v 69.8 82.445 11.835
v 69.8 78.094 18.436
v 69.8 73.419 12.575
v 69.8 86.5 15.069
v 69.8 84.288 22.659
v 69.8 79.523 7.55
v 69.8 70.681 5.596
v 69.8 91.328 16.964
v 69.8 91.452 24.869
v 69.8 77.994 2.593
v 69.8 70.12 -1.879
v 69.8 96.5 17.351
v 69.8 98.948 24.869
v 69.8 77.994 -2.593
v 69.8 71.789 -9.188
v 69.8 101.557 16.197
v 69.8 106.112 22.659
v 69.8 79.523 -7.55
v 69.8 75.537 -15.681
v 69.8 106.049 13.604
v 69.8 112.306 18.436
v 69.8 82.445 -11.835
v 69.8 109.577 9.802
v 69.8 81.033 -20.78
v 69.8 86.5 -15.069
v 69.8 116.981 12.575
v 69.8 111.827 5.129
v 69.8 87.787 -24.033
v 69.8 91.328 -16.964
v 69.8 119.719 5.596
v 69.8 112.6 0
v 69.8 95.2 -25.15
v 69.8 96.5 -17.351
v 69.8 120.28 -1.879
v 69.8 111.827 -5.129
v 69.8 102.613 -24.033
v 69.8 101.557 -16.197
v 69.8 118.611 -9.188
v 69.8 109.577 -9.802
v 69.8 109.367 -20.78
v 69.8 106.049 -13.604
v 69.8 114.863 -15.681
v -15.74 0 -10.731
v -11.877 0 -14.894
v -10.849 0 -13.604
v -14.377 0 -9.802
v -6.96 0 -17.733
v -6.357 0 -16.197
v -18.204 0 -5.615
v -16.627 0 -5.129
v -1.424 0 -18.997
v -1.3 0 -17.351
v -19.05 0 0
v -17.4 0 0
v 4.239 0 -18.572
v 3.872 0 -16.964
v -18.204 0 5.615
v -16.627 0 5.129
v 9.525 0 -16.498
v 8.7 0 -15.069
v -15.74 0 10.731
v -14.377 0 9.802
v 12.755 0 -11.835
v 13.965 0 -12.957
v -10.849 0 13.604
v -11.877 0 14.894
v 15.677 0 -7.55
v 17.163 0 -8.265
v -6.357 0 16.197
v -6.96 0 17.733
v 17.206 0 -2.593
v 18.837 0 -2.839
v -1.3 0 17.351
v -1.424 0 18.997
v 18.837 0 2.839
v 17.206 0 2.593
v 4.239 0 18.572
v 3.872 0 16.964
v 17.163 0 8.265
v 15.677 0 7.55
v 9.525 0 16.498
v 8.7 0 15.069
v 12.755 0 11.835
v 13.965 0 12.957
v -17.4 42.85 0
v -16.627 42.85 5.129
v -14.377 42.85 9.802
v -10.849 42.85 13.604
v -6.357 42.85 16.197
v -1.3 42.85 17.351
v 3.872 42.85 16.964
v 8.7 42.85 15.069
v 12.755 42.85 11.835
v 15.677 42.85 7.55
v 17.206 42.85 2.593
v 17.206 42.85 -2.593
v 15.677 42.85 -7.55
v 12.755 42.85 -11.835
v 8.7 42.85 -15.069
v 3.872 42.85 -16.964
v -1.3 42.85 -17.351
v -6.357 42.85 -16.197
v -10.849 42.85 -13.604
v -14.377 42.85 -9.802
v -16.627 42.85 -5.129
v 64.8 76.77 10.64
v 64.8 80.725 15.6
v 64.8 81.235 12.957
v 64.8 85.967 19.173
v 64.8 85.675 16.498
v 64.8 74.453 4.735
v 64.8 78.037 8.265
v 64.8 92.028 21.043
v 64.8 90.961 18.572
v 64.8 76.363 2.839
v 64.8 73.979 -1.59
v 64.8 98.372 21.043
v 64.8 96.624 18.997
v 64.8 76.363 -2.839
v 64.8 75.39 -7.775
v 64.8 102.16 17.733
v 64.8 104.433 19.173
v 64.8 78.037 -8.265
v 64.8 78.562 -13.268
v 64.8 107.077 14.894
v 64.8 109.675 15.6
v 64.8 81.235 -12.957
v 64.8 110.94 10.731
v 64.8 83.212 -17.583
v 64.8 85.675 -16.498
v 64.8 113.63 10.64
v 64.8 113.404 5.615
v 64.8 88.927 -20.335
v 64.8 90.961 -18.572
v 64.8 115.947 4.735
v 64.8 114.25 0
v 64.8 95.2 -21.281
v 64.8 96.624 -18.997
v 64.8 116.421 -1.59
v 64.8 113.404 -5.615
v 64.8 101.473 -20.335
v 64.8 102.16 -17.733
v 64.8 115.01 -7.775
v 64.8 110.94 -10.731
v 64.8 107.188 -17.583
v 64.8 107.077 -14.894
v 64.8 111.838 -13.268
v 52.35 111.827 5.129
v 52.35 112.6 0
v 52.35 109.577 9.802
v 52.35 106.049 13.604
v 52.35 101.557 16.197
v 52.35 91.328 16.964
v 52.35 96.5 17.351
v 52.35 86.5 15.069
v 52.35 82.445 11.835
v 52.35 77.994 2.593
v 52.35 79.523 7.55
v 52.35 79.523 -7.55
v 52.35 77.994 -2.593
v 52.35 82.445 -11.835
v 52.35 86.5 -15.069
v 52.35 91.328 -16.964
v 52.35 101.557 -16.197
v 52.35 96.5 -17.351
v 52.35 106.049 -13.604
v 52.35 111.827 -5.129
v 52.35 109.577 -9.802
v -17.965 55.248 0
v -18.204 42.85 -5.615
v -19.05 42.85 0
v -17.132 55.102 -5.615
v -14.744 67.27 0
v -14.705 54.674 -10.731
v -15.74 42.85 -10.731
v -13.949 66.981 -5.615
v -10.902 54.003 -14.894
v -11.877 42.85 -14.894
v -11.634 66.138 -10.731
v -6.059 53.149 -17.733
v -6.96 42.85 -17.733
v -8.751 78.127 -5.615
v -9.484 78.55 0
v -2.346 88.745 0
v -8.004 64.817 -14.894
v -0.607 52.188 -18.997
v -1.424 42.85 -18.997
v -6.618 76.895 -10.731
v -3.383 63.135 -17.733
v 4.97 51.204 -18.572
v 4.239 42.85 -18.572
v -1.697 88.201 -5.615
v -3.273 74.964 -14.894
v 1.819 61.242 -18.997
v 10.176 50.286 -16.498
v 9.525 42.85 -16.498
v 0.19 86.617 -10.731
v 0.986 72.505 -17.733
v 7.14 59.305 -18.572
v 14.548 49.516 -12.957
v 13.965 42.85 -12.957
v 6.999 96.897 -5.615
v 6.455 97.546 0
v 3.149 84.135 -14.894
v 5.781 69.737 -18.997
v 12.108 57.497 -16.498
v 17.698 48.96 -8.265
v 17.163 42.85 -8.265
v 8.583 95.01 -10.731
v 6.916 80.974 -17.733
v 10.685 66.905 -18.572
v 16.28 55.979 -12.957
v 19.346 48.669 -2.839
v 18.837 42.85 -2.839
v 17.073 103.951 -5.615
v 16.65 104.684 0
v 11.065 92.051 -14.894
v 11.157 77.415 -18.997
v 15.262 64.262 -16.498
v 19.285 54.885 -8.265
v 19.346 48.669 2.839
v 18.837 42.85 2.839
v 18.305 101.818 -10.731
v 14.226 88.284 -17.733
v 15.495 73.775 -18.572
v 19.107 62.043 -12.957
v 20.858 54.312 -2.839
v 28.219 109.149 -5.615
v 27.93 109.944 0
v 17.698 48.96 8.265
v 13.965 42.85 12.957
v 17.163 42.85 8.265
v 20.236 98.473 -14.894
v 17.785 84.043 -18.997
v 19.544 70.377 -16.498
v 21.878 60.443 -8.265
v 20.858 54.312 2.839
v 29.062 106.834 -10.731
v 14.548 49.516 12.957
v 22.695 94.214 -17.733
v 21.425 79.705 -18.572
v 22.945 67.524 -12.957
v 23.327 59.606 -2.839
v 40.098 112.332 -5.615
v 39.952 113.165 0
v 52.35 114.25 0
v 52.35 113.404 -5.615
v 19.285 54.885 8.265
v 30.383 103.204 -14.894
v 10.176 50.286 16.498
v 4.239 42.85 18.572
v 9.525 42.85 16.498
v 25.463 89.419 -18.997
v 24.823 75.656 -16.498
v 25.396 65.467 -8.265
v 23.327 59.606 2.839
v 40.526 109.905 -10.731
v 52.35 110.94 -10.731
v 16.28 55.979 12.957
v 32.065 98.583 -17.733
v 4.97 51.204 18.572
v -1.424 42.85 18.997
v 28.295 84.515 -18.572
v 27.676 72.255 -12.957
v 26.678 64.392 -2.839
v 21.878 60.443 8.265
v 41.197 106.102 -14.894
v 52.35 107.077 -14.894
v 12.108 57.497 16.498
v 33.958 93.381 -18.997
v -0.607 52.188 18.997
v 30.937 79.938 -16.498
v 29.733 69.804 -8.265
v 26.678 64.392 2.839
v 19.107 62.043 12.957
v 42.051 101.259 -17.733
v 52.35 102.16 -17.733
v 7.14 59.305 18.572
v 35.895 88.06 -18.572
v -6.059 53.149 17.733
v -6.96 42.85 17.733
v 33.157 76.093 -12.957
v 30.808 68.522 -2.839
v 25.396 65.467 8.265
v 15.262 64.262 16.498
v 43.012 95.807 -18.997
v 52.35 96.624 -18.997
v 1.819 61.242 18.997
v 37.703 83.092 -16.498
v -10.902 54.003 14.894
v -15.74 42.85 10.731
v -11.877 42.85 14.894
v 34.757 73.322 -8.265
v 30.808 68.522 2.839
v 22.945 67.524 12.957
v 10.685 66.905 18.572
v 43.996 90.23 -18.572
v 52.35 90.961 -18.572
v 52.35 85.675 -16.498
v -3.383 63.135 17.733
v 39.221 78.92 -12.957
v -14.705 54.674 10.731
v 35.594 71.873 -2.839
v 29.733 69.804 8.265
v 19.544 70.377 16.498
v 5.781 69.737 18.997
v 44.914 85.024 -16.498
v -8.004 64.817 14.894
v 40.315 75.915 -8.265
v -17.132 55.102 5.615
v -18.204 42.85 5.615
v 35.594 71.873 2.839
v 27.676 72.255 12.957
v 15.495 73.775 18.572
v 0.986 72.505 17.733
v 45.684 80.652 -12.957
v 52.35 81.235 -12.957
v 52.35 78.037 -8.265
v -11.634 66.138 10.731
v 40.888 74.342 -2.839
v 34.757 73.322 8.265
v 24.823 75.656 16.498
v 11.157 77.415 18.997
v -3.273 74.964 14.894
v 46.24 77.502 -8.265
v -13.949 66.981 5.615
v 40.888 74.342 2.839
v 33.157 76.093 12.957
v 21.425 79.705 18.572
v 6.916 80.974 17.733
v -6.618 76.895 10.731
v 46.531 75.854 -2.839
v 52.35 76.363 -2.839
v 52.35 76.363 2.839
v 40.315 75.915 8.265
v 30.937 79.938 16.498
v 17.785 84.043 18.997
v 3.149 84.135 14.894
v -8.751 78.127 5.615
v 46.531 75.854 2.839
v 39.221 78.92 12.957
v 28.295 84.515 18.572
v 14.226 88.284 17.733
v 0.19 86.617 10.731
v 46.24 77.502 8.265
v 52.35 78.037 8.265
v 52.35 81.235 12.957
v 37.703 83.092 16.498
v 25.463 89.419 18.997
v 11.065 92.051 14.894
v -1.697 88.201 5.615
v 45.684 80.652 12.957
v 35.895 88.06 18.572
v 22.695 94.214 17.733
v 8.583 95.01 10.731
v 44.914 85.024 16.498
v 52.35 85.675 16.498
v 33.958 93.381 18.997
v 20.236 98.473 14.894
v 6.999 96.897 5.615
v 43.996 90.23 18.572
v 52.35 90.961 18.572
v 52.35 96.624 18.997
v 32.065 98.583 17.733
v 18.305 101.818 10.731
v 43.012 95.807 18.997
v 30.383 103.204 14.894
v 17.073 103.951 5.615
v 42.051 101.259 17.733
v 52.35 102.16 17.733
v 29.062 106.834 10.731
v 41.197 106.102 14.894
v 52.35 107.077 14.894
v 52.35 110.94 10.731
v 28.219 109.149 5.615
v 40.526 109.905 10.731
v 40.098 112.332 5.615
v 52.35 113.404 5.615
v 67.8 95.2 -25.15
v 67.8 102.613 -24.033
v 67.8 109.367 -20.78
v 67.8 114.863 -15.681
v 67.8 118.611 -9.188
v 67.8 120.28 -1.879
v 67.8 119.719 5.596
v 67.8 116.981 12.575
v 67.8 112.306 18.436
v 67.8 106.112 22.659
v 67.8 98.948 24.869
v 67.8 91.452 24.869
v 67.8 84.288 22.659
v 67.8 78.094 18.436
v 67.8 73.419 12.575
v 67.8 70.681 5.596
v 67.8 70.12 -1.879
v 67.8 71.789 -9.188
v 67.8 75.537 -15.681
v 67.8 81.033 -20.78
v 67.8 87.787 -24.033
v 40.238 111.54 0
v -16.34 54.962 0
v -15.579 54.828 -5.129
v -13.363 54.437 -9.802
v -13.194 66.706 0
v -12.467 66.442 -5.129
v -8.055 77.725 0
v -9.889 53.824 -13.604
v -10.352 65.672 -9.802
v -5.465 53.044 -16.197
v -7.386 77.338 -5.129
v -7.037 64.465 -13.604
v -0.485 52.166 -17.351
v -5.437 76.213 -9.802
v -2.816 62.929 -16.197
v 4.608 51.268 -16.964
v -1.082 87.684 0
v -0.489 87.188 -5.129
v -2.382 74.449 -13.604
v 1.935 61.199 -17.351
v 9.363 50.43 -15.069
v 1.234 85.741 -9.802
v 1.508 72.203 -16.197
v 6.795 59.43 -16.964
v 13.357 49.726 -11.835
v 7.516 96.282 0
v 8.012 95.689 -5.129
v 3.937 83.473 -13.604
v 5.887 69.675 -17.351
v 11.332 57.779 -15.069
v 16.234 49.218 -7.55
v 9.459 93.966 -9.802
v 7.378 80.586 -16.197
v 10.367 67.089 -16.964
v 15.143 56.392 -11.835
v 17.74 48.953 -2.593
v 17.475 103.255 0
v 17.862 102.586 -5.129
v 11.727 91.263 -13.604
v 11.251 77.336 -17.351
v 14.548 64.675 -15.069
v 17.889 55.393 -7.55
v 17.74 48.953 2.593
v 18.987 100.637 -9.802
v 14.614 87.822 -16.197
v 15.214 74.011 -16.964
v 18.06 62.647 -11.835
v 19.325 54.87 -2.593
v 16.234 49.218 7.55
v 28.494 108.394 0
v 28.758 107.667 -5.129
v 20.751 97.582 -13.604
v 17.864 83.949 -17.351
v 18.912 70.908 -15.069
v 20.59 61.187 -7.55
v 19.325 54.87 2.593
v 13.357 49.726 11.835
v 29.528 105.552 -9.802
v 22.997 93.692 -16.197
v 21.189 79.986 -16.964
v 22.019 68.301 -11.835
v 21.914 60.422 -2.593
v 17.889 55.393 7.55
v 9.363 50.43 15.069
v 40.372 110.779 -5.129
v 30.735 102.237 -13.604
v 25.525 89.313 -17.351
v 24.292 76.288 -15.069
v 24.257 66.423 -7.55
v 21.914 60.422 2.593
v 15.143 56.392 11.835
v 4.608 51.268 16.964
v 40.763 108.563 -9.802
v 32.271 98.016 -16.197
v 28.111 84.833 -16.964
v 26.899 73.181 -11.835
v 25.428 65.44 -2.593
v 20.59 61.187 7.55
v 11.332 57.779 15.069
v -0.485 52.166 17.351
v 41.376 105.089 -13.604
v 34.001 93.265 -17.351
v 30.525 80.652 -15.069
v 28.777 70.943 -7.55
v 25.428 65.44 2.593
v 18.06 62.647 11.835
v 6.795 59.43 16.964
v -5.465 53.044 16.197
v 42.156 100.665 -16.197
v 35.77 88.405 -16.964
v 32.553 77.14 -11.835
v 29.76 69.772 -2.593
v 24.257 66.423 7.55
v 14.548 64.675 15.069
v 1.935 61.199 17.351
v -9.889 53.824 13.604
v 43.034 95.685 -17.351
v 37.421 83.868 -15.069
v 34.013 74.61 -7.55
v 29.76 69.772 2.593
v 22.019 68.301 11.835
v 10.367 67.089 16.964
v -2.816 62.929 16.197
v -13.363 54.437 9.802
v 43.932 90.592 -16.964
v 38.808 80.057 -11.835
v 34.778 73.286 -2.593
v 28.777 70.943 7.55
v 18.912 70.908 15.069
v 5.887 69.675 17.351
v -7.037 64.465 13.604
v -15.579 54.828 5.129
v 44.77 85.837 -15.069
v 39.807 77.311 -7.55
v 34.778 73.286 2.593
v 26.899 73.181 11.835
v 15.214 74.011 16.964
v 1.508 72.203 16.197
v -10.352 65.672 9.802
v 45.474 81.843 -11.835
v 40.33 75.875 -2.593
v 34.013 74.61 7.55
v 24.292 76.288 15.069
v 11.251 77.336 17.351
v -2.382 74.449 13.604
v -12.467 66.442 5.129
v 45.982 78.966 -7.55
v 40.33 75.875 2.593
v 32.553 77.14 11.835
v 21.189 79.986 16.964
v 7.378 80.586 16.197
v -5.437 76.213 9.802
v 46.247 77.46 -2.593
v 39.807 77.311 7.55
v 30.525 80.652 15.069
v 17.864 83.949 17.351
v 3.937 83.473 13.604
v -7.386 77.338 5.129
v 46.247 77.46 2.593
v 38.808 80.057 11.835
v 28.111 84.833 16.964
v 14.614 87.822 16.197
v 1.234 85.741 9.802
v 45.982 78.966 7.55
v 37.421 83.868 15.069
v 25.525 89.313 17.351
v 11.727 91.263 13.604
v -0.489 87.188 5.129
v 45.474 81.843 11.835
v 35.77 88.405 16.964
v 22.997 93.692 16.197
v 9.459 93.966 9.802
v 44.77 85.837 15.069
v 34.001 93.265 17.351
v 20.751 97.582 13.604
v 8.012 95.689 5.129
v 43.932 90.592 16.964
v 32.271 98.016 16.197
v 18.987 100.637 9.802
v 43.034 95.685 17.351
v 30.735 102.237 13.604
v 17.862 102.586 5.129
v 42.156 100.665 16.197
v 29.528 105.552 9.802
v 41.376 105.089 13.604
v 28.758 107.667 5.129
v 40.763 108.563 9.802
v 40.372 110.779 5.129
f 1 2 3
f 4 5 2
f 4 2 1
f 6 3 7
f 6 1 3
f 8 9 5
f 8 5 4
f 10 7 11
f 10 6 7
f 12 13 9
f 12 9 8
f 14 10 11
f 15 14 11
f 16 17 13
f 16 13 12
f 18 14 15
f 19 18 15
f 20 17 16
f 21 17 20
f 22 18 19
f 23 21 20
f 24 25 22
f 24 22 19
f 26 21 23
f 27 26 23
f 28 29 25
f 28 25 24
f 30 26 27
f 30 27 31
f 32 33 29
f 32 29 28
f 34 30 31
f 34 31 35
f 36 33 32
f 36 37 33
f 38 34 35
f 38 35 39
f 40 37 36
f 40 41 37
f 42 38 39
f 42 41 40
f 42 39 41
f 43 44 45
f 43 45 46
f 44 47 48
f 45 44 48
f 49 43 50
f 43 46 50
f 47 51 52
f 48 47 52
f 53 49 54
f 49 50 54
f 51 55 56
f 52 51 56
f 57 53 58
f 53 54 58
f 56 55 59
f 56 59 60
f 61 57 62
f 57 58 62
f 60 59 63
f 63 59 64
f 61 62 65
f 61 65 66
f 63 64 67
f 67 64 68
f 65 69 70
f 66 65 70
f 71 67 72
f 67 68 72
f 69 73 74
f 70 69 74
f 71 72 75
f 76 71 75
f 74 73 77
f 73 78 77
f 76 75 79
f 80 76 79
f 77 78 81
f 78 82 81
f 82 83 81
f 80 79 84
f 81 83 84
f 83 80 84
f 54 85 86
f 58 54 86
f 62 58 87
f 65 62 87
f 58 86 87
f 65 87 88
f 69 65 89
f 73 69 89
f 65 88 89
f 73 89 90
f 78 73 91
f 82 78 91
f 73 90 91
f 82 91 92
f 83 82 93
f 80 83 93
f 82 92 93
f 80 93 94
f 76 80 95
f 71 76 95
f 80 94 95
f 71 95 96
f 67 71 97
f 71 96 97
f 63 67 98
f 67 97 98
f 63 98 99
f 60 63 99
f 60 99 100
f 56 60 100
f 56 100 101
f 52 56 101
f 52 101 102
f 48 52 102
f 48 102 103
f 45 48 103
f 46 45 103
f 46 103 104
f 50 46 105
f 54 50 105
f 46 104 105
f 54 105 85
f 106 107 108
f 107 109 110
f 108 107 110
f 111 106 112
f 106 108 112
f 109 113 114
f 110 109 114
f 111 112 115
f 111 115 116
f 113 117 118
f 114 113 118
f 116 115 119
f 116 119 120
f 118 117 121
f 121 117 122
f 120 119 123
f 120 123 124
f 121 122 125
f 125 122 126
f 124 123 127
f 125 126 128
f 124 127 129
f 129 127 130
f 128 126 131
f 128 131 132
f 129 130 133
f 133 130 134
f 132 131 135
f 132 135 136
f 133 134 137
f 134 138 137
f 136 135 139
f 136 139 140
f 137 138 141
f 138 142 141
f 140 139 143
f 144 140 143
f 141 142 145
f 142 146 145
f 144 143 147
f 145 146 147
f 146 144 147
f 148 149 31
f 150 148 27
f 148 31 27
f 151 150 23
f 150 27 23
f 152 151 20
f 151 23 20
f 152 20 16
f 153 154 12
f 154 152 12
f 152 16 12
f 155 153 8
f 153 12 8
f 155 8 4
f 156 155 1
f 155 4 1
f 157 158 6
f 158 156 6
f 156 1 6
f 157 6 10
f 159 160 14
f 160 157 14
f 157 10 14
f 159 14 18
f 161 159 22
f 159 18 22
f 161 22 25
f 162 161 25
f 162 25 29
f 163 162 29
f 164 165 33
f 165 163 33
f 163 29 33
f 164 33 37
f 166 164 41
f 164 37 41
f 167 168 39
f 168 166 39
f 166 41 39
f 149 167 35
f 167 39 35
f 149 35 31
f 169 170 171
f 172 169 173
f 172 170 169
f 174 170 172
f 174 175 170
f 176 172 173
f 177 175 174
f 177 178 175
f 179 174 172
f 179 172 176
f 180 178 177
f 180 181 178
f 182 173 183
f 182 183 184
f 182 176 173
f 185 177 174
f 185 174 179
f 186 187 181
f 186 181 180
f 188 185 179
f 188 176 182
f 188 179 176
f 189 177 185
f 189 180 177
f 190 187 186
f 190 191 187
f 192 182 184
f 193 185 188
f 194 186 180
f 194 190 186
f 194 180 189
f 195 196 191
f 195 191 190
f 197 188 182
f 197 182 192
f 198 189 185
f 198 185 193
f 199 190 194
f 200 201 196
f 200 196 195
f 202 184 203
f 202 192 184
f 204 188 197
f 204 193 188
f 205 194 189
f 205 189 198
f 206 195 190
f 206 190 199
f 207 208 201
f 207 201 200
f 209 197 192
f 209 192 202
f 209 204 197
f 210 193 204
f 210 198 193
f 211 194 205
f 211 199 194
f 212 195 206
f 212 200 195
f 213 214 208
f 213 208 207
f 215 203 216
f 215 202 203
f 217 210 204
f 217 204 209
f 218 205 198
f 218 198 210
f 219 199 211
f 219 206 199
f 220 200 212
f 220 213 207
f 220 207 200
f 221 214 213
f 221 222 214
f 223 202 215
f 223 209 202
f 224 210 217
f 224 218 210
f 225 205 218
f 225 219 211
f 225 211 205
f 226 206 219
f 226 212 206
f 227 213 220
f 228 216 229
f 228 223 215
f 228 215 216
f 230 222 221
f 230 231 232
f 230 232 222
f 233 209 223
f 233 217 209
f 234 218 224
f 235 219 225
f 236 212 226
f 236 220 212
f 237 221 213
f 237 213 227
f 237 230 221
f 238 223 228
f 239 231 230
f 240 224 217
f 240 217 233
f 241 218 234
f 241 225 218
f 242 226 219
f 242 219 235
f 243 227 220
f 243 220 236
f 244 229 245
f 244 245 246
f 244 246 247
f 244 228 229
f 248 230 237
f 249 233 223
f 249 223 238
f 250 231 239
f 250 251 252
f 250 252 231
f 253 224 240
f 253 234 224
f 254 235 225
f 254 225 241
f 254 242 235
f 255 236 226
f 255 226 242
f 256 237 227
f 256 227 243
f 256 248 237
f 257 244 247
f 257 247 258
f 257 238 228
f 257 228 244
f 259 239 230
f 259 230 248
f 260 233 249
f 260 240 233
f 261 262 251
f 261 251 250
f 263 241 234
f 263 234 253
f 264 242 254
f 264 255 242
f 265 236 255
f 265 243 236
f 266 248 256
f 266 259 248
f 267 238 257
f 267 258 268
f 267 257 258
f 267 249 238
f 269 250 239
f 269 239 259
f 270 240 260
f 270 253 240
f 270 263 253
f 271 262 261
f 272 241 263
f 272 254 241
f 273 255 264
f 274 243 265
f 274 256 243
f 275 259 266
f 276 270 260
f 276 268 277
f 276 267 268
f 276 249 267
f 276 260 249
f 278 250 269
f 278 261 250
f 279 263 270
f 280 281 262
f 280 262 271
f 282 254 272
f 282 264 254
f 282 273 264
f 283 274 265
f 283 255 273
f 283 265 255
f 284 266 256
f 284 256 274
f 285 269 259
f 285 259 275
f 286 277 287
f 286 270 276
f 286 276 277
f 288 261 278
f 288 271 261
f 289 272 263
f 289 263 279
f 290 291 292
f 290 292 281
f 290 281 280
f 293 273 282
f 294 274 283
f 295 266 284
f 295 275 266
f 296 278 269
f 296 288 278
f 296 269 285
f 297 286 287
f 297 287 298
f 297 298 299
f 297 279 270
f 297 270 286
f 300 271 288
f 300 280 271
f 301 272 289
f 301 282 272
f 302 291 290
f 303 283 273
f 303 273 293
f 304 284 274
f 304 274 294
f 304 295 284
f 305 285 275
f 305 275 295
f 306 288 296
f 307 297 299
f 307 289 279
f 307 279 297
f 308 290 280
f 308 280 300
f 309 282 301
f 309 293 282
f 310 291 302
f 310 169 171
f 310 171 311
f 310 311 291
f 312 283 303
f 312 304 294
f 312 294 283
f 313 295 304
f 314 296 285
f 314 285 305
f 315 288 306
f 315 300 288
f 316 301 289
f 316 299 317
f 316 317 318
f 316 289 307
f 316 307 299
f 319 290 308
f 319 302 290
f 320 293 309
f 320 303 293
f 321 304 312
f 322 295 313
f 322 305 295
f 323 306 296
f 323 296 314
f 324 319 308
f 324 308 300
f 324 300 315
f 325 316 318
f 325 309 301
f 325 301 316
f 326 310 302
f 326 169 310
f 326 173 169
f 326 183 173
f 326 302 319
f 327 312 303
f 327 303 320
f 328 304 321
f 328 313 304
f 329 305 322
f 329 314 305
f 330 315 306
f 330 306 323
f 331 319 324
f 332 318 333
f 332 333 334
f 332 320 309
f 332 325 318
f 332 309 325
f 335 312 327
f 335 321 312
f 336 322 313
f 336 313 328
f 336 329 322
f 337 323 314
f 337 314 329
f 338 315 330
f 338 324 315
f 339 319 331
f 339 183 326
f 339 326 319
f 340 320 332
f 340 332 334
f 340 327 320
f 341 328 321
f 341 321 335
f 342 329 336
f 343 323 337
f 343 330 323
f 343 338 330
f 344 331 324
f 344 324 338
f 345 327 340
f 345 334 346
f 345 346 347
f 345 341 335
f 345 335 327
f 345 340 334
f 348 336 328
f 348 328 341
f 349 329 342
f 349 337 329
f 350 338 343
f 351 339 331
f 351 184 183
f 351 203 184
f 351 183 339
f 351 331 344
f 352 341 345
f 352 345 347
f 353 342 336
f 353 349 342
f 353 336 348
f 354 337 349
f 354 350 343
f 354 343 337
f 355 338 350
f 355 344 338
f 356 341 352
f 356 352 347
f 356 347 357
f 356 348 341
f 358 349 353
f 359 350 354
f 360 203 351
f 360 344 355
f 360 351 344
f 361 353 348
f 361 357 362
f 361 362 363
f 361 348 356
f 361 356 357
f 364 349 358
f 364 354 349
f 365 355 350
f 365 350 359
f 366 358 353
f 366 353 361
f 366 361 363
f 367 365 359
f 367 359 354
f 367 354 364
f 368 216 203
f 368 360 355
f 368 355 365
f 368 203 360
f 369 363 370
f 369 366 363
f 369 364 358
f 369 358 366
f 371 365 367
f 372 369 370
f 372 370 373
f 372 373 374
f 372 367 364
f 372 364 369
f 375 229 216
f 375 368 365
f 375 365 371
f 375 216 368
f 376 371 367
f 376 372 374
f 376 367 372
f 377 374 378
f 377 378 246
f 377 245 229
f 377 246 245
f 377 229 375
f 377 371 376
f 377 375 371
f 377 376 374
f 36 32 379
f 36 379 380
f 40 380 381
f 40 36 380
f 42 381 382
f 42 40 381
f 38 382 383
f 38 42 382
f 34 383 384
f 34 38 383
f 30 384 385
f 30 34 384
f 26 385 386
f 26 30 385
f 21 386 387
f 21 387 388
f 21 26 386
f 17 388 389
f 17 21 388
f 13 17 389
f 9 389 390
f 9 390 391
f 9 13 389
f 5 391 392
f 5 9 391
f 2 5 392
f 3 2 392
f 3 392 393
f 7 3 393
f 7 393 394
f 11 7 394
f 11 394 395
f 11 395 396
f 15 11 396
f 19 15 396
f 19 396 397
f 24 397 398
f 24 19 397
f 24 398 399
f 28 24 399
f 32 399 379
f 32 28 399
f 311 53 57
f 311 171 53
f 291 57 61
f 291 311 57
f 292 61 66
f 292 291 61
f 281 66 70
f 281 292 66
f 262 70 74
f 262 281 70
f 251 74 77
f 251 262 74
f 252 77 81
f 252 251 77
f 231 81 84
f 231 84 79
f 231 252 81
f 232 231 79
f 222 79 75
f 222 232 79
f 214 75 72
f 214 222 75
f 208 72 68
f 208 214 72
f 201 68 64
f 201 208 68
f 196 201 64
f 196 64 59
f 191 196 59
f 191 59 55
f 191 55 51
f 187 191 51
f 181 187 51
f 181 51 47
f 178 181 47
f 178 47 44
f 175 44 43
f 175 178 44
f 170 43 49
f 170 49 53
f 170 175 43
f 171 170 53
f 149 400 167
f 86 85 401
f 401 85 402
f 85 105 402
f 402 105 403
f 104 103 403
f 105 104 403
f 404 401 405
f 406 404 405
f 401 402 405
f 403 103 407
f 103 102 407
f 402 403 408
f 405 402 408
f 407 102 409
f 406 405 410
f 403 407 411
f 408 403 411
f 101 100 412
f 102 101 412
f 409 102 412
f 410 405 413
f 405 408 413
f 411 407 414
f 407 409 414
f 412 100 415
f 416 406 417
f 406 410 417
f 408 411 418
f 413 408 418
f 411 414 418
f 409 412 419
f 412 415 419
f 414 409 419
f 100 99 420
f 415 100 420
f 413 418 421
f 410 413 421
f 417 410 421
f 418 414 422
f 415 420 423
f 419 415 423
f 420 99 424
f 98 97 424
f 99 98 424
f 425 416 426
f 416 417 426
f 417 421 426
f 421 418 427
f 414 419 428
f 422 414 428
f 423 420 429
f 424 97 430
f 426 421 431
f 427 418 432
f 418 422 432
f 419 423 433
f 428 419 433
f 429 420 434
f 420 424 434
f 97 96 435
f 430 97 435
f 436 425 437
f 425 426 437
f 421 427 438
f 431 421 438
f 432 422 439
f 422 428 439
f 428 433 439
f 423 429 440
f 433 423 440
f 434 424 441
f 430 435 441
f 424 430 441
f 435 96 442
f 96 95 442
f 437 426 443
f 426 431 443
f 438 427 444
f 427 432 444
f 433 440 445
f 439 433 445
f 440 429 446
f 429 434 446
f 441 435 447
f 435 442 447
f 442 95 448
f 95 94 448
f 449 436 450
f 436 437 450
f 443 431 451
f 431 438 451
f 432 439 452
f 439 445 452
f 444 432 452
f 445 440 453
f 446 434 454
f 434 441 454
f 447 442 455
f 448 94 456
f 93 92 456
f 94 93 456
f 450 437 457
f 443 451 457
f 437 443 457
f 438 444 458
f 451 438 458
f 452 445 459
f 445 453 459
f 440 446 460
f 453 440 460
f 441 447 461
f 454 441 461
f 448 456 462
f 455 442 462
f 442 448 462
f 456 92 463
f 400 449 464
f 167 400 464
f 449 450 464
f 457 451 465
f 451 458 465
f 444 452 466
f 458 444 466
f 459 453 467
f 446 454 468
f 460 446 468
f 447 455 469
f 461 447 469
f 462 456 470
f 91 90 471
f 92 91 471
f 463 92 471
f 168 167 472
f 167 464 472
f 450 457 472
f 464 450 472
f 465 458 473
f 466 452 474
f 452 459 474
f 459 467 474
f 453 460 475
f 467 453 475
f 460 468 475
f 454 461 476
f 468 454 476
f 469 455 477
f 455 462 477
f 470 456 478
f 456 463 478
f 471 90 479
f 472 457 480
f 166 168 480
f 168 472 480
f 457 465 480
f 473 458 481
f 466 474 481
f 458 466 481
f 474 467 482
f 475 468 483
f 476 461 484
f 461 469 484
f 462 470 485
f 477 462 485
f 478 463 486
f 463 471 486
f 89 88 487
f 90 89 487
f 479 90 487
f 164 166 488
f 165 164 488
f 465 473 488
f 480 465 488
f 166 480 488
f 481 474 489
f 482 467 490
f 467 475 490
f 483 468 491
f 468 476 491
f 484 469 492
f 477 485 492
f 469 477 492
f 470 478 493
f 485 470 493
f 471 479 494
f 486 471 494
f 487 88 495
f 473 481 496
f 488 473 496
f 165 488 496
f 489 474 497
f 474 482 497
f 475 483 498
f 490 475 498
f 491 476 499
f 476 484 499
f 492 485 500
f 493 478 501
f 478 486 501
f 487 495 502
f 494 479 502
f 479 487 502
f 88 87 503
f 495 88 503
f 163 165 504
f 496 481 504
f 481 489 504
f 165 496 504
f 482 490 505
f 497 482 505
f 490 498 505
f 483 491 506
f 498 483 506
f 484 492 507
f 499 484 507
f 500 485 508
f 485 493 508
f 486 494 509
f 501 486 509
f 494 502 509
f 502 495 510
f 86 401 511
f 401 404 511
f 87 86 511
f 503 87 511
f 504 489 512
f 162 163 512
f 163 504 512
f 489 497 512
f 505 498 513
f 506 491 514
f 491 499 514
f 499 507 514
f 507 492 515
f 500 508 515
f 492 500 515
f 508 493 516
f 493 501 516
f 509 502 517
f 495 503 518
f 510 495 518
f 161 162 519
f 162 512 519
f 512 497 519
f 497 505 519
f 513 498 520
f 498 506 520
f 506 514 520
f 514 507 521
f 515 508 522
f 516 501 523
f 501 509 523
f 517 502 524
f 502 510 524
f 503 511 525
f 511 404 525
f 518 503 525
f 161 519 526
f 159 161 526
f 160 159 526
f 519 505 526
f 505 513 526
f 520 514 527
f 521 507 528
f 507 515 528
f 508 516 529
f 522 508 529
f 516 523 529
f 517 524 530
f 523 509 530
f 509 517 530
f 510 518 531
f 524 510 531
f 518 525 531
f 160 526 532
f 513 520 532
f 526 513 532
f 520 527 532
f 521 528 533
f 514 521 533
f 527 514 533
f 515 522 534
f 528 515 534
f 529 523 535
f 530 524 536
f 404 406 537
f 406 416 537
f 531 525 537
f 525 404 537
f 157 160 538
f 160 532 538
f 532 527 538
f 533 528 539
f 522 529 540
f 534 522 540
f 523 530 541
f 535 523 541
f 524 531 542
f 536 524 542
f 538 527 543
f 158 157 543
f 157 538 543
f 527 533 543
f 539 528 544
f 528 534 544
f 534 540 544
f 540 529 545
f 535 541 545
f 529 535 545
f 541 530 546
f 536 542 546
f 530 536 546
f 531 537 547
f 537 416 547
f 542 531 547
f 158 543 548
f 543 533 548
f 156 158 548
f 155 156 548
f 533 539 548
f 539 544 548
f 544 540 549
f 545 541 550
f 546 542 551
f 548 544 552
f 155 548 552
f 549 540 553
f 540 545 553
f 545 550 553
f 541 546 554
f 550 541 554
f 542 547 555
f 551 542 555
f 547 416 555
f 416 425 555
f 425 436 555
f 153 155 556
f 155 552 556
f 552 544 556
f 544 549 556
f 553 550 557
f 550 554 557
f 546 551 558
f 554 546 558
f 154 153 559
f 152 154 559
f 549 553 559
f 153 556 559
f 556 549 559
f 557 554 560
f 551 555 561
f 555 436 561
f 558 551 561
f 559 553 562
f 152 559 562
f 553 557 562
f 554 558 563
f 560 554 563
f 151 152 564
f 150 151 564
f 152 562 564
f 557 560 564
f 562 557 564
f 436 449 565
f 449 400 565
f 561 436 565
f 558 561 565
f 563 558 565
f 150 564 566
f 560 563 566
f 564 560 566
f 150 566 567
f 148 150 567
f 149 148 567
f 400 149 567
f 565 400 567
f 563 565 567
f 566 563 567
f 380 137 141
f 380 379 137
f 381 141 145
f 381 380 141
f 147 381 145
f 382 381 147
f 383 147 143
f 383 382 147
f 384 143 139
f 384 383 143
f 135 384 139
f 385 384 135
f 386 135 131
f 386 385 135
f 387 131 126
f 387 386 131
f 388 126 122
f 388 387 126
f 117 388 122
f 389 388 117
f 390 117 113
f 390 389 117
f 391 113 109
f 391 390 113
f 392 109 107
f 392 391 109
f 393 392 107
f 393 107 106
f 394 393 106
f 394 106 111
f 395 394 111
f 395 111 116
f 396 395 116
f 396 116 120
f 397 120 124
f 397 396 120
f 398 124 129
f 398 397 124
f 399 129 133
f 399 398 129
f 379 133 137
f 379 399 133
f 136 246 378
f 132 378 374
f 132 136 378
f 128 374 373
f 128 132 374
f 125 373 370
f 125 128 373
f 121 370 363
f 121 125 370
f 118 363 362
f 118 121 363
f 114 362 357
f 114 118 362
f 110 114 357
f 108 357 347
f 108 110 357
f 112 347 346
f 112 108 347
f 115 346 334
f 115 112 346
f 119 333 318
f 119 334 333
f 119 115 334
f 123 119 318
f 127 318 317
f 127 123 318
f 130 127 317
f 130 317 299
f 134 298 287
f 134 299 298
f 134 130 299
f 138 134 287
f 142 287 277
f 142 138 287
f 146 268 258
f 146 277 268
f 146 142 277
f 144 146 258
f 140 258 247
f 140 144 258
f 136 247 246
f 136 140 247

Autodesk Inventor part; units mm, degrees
ref_plane "YZ Plane" through (0, 0, 0) normal (1, 0, 0) x (0, 1, 0)
ref_plane "XZ Plane" through (0, 0, 0) normal (0, 1, 0) x (-1, 0, 0)
ref_plane "XY Plane" through (0, 0, 0) normal (0, 0, 1) x (1, 0, 0)
sketch "Sketch1" plane through (0, 0, 0) normal (0, 0, 1) x (1, 0, 0)
  line L0 (0, 0) -> (0, 42.85)
  line L1 (52.35, 95.2) -> (69.8, 95.2)
  arc A0 (52.35, 95.2) -> (0, 42.85) centre (52.35, 42.85) ccw
  dimension "d1" = 95.2
  dimension "d2" = 69.8
  dimension "d4" = 52.35
sketch "Sketch2" plane through (0, 0, 0) normal (0, 1, 0) x (-1, 0, 0)
  circle A0 centre (0, 0) radius 19.05
  circle A1 centre (0, 0) radius 17.4
  dimension "d3" = 38.1
  dimension "d11" = 1.65
sweep "Sweep1" add profiles "Sketch2" path "Sketch1"
sketch "Sketch3" plane through (69.8, 95.2, 0) normal (1, 0, 0) x (0, 0, -1)
  circle A0 centre (0, 0) radius 19.05 projected
  circle A1 centre (0, 0) radius 25.15
  point P0 (0, -95.2)
  dimension "d6" = 50.3
extrude "Extrusion1" add sketch "Sketch3" against normal blind 5
chamfer "Chamfer1" distance 3 distance2 3.8692 1 edges at (64.8, 95.2, 25.15) measured on face at (66.4667, 91.1657, -24.8243)
equation "\"d4\" = 0.75 * d2"
equation "\"d15\" = 0.0769231 * d6"
properties part number "Ferrule 90 deg Elb-38.1"
